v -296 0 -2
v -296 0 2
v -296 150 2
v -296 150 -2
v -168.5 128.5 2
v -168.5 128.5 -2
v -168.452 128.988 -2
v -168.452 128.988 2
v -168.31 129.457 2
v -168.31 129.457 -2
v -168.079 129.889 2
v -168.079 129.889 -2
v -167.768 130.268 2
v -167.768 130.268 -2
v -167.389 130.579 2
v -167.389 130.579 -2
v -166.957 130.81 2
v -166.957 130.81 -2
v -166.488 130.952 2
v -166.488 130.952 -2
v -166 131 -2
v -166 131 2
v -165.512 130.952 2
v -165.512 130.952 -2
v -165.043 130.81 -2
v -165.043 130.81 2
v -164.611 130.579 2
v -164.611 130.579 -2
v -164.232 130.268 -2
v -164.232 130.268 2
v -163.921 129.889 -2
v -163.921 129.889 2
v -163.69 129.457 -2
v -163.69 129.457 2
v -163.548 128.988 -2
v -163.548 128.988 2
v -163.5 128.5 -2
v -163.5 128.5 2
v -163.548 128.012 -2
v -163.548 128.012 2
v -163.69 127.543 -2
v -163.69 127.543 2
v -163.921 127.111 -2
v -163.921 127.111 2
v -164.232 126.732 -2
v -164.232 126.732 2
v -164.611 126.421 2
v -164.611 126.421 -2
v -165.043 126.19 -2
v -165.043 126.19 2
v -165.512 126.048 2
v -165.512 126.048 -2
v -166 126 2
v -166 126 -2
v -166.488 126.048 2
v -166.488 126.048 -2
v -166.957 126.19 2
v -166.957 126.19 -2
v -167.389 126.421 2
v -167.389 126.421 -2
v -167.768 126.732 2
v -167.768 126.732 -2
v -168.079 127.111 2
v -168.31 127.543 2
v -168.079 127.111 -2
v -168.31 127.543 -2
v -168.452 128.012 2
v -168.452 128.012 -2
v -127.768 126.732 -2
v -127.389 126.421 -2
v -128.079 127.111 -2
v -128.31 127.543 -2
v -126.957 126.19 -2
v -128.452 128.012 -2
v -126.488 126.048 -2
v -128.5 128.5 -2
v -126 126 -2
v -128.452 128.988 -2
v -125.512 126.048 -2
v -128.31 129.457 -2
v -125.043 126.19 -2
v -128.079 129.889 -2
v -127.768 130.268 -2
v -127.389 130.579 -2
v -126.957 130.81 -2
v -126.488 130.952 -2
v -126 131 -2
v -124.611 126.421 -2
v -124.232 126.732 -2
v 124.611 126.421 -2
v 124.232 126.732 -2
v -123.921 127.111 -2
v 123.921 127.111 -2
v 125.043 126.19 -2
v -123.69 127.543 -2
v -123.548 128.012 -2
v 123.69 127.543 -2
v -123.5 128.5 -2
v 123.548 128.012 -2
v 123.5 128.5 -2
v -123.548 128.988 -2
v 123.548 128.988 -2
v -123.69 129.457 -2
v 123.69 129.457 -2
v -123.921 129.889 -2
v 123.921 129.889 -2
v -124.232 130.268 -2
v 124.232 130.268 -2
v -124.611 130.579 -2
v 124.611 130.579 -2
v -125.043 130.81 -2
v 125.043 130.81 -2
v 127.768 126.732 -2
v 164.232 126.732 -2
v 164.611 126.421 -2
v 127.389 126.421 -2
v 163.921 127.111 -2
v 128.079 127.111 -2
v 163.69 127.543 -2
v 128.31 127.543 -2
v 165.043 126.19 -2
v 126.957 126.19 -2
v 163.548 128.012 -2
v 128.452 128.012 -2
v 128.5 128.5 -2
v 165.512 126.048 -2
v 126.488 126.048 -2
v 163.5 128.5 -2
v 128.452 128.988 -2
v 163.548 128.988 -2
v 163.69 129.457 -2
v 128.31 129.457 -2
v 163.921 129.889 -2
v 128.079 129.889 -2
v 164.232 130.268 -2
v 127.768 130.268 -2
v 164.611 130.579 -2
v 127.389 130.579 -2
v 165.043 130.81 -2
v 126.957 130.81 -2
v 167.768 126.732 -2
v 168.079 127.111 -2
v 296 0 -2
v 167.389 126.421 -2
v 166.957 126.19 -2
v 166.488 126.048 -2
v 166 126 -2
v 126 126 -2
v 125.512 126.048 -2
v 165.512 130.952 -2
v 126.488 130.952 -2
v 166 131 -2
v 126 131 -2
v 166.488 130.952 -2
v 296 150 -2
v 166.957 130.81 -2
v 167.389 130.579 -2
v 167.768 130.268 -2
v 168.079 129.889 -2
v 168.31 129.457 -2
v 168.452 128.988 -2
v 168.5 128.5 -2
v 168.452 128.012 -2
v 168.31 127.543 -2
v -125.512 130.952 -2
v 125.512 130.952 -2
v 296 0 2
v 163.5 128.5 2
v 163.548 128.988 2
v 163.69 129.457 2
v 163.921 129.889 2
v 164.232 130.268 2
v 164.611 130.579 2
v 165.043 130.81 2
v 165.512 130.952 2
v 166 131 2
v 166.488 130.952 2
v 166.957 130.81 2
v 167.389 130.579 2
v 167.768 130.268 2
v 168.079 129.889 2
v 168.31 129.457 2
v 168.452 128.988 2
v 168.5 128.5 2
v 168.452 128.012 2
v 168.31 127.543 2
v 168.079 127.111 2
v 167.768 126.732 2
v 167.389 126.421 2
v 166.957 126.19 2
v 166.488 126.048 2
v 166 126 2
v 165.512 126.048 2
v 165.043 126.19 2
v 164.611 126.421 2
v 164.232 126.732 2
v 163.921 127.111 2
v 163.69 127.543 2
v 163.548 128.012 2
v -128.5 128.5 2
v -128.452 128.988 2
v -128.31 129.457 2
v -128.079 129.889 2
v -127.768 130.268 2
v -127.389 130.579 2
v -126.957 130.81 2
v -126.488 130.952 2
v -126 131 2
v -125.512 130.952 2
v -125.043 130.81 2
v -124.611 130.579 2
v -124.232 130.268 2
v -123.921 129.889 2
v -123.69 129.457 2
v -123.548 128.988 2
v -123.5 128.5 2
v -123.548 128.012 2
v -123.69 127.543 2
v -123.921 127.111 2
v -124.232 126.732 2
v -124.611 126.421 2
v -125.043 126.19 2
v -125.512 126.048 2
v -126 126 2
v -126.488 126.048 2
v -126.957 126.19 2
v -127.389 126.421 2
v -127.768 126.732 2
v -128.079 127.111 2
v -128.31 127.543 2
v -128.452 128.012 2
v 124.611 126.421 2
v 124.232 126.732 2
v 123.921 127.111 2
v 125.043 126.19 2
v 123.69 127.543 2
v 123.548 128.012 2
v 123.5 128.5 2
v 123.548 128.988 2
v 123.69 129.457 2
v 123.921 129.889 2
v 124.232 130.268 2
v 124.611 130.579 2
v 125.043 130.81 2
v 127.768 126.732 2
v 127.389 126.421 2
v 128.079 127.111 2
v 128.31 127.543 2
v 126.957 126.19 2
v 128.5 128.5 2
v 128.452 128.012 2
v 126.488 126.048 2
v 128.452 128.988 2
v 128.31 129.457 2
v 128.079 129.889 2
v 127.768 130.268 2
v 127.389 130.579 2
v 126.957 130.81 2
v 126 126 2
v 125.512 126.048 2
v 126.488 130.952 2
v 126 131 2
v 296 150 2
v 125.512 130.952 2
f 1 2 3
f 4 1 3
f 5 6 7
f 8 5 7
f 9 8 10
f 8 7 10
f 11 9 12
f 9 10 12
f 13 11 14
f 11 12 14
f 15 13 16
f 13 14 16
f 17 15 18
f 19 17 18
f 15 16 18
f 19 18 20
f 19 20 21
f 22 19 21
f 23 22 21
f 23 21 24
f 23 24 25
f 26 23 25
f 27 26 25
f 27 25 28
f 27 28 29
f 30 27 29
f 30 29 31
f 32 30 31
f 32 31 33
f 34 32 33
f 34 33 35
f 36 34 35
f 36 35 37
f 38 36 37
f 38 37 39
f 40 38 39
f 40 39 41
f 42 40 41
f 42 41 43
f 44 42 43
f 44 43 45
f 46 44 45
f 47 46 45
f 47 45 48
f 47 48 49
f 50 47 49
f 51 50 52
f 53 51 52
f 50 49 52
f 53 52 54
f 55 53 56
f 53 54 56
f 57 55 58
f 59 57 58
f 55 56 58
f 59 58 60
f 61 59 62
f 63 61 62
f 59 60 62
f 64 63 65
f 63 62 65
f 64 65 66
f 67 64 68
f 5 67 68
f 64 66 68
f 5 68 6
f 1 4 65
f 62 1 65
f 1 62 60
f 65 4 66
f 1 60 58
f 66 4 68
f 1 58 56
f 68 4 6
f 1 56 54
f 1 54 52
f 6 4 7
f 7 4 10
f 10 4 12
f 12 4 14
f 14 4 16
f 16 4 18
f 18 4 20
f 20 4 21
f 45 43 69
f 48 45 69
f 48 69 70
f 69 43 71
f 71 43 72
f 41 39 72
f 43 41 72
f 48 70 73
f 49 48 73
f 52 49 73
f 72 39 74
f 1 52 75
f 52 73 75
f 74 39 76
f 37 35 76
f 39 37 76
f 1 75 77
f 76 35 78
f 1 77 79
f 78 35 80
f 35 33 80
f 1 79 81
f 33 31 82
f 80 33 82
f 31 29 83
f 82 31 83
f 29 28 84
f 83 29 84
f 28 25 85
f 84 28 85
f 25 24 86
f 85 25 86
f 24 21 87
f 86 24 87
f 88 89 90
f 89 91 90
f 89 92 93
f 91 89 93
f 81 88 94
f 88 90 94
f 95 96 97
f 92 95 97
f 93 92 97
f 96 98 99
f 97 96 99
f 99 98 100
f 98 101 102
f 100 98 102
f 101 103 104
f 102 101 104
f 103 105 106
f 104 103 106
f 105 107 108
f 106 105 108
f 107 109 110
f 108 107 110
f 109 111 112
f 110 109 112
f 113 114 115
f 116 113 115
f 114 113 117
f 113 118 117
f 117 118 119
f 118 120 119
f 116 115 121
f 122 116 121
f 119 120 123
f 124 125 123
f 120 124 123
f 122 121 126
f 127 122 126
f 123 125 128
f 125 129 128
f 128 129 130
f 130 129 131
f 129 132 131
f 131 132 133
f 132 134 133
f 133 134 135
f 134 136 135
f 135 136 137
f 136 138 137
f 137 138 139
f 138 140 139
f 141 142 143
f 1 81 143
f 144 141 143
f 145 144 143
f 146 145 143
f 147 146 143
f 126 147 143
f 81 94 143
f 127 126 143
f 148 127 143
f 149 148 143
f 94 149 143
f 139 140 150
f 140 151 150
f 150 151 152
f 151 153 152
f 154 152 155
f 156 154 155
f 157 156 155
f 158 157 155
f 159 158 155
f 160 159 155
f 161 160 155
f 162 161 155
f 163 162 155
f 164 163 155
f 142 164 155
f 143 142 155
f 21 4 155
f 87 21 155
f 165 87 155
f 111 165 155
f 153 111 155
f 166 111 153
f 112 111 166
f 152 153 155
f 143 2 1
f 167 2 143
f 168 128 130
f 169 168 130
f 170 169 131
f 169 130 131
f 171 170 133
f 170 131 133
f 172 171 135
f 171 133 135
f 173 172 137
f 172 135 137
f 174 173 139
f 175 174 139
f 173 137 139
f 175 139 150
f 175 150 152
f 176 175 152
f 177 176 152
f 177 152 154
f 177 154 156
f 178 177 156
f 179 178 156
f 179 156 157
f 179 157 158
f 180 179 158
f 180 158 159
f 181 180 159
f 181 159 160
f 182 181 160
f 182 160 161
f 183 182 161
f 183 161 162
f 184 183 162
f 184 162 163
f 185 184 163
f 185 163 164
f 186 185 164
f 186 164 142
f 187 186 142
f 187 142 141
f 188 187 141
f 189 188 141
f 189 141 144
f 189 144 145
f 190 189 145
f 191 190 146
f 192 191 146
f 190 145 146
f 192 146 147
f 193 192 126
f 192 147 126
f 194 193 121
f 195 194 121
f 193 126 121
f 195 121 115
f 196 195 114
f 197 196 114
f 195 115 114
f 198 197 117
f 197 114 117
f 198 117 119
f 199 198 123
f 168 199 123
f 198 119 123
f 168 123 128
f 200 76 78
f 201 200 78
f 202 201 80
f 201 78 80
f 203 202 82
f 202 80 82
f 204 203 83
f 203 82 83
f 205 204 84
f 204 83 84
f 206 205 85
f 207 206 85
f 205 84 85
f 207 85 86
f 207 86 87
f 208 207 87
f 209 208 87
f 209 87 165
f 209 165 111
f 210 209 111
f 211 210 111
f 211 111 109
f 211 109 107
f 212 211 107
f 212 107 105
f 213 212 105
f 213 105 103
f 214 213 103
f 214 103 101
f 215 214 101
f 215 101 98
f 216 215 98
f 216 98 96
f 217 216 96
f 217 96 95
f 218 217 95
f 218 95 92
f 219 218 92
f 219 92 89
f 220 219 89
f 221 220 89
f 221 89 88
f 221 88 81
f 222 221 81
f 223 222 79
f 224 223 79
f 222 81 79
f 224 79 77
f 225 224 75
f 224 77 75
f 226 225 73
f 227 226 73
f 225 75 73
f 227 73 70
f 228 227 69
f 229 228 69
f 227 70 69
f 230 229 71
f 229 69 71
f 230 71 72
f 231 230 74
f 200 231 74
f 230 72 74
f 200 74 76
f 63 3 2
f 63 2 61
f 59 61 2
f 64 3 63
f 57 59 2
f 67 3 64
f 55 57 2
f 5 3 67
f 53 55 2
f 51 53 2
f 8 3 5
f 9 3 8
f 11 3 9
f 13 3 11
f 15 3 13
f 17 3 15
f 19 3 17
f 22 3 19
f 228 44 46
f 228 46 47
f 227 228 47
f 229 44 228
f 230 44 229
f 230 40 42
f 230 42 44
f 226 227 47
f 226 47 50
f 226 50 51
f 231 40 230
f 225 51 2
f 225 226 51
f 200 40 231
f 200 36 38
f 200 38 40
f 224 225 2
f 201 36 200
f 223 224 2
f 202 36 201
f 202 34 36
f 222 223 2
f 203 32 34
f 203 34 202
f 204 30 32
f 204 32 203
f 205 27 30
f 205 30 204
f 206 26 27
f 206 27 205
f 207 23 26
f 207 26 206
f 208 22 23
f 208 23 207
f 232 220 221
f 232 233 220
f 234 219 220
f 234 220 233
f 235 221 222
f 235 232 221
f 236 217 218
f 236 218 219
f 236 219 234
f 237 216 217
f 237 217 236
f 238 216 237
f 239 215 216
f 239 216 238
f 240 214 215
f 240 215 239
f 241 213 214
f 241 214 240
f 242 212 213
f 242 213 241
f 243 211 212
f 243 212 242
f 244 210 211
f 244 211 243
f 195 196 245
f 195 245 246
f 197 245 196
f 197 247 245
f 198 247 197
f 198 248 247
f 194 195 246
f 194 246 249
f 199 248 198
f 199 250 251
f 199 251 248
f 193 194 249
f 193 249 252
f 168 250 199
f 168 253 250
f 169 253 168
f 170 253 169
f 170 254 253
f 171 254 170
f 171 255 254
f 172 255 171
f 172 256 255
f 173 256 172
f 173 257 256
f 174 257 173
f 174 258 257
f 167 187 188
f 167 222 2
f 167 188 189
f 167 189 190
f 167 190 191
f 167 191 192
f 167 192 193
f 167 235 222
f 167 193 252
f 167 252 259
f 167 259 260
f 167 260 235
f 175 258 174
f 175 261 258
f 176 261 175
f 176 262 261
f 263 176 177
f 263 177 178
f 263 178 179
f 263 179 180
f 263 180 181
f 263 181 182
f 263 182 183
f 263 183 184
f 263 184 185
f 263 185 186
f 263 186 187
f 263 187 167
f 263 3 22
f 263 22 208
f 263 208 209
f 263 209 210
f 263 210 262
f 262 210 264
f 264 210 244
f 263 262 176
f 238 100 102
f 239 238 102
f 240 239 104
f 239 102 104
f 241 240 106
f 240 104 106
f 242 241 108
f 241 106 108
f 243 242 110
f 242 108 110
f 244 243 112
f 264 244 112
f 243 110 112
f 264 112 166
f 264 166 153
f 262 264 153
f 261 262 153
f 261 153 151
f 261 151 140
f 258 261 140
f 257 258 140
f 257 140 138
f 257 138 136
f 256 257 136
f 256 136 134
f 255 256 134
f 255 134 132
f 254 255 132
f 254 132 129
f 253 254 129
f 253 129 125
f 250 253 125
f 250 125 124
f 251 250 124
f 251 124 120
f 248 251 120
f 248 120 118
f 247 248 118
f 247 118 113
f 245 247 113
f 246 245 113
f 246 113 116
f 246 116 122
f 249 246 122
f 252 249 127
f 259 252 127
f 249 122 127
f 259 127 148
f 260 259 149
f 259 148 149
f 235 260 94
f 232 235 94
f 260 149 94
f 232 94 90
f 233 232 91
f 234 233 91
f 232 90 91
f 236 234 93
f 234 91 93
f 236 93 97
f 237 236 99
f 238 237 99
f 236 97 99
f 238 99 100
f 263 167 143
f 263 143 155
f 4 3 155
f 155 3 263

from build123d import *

# Parameters (mm, degrees)
SKETCH1_W               = 592
SKETCH1_H               = 150
BOSS_EXTRUDE1_DEPTH     = 2
TAP_DRILL_FOR_M6_TAP1_D = 5


with BuildPart() as part:
    # Sketch1 → Boss-Extrude1 (new, symmetric)
    with BuildSketch(Plane.XY):
        with Locations((0, 75)):
            Rectangle(SKETCH1_W, SKETCH1_H)
    extrude(amount=BOSS_EXTRUDE1_DEPTH, both=True)

    # Tap Drill for M6 Tap1 (through all)
    with Locations(Plane.XY.offset(2)):
        with Locations((-166, 128.5), (-126, 128.5), (126, 128.5), (166, 128.5)):
            Hole(TAP_DRILL_FOR_M6_TAP1_D / 2)


solid = part.part
